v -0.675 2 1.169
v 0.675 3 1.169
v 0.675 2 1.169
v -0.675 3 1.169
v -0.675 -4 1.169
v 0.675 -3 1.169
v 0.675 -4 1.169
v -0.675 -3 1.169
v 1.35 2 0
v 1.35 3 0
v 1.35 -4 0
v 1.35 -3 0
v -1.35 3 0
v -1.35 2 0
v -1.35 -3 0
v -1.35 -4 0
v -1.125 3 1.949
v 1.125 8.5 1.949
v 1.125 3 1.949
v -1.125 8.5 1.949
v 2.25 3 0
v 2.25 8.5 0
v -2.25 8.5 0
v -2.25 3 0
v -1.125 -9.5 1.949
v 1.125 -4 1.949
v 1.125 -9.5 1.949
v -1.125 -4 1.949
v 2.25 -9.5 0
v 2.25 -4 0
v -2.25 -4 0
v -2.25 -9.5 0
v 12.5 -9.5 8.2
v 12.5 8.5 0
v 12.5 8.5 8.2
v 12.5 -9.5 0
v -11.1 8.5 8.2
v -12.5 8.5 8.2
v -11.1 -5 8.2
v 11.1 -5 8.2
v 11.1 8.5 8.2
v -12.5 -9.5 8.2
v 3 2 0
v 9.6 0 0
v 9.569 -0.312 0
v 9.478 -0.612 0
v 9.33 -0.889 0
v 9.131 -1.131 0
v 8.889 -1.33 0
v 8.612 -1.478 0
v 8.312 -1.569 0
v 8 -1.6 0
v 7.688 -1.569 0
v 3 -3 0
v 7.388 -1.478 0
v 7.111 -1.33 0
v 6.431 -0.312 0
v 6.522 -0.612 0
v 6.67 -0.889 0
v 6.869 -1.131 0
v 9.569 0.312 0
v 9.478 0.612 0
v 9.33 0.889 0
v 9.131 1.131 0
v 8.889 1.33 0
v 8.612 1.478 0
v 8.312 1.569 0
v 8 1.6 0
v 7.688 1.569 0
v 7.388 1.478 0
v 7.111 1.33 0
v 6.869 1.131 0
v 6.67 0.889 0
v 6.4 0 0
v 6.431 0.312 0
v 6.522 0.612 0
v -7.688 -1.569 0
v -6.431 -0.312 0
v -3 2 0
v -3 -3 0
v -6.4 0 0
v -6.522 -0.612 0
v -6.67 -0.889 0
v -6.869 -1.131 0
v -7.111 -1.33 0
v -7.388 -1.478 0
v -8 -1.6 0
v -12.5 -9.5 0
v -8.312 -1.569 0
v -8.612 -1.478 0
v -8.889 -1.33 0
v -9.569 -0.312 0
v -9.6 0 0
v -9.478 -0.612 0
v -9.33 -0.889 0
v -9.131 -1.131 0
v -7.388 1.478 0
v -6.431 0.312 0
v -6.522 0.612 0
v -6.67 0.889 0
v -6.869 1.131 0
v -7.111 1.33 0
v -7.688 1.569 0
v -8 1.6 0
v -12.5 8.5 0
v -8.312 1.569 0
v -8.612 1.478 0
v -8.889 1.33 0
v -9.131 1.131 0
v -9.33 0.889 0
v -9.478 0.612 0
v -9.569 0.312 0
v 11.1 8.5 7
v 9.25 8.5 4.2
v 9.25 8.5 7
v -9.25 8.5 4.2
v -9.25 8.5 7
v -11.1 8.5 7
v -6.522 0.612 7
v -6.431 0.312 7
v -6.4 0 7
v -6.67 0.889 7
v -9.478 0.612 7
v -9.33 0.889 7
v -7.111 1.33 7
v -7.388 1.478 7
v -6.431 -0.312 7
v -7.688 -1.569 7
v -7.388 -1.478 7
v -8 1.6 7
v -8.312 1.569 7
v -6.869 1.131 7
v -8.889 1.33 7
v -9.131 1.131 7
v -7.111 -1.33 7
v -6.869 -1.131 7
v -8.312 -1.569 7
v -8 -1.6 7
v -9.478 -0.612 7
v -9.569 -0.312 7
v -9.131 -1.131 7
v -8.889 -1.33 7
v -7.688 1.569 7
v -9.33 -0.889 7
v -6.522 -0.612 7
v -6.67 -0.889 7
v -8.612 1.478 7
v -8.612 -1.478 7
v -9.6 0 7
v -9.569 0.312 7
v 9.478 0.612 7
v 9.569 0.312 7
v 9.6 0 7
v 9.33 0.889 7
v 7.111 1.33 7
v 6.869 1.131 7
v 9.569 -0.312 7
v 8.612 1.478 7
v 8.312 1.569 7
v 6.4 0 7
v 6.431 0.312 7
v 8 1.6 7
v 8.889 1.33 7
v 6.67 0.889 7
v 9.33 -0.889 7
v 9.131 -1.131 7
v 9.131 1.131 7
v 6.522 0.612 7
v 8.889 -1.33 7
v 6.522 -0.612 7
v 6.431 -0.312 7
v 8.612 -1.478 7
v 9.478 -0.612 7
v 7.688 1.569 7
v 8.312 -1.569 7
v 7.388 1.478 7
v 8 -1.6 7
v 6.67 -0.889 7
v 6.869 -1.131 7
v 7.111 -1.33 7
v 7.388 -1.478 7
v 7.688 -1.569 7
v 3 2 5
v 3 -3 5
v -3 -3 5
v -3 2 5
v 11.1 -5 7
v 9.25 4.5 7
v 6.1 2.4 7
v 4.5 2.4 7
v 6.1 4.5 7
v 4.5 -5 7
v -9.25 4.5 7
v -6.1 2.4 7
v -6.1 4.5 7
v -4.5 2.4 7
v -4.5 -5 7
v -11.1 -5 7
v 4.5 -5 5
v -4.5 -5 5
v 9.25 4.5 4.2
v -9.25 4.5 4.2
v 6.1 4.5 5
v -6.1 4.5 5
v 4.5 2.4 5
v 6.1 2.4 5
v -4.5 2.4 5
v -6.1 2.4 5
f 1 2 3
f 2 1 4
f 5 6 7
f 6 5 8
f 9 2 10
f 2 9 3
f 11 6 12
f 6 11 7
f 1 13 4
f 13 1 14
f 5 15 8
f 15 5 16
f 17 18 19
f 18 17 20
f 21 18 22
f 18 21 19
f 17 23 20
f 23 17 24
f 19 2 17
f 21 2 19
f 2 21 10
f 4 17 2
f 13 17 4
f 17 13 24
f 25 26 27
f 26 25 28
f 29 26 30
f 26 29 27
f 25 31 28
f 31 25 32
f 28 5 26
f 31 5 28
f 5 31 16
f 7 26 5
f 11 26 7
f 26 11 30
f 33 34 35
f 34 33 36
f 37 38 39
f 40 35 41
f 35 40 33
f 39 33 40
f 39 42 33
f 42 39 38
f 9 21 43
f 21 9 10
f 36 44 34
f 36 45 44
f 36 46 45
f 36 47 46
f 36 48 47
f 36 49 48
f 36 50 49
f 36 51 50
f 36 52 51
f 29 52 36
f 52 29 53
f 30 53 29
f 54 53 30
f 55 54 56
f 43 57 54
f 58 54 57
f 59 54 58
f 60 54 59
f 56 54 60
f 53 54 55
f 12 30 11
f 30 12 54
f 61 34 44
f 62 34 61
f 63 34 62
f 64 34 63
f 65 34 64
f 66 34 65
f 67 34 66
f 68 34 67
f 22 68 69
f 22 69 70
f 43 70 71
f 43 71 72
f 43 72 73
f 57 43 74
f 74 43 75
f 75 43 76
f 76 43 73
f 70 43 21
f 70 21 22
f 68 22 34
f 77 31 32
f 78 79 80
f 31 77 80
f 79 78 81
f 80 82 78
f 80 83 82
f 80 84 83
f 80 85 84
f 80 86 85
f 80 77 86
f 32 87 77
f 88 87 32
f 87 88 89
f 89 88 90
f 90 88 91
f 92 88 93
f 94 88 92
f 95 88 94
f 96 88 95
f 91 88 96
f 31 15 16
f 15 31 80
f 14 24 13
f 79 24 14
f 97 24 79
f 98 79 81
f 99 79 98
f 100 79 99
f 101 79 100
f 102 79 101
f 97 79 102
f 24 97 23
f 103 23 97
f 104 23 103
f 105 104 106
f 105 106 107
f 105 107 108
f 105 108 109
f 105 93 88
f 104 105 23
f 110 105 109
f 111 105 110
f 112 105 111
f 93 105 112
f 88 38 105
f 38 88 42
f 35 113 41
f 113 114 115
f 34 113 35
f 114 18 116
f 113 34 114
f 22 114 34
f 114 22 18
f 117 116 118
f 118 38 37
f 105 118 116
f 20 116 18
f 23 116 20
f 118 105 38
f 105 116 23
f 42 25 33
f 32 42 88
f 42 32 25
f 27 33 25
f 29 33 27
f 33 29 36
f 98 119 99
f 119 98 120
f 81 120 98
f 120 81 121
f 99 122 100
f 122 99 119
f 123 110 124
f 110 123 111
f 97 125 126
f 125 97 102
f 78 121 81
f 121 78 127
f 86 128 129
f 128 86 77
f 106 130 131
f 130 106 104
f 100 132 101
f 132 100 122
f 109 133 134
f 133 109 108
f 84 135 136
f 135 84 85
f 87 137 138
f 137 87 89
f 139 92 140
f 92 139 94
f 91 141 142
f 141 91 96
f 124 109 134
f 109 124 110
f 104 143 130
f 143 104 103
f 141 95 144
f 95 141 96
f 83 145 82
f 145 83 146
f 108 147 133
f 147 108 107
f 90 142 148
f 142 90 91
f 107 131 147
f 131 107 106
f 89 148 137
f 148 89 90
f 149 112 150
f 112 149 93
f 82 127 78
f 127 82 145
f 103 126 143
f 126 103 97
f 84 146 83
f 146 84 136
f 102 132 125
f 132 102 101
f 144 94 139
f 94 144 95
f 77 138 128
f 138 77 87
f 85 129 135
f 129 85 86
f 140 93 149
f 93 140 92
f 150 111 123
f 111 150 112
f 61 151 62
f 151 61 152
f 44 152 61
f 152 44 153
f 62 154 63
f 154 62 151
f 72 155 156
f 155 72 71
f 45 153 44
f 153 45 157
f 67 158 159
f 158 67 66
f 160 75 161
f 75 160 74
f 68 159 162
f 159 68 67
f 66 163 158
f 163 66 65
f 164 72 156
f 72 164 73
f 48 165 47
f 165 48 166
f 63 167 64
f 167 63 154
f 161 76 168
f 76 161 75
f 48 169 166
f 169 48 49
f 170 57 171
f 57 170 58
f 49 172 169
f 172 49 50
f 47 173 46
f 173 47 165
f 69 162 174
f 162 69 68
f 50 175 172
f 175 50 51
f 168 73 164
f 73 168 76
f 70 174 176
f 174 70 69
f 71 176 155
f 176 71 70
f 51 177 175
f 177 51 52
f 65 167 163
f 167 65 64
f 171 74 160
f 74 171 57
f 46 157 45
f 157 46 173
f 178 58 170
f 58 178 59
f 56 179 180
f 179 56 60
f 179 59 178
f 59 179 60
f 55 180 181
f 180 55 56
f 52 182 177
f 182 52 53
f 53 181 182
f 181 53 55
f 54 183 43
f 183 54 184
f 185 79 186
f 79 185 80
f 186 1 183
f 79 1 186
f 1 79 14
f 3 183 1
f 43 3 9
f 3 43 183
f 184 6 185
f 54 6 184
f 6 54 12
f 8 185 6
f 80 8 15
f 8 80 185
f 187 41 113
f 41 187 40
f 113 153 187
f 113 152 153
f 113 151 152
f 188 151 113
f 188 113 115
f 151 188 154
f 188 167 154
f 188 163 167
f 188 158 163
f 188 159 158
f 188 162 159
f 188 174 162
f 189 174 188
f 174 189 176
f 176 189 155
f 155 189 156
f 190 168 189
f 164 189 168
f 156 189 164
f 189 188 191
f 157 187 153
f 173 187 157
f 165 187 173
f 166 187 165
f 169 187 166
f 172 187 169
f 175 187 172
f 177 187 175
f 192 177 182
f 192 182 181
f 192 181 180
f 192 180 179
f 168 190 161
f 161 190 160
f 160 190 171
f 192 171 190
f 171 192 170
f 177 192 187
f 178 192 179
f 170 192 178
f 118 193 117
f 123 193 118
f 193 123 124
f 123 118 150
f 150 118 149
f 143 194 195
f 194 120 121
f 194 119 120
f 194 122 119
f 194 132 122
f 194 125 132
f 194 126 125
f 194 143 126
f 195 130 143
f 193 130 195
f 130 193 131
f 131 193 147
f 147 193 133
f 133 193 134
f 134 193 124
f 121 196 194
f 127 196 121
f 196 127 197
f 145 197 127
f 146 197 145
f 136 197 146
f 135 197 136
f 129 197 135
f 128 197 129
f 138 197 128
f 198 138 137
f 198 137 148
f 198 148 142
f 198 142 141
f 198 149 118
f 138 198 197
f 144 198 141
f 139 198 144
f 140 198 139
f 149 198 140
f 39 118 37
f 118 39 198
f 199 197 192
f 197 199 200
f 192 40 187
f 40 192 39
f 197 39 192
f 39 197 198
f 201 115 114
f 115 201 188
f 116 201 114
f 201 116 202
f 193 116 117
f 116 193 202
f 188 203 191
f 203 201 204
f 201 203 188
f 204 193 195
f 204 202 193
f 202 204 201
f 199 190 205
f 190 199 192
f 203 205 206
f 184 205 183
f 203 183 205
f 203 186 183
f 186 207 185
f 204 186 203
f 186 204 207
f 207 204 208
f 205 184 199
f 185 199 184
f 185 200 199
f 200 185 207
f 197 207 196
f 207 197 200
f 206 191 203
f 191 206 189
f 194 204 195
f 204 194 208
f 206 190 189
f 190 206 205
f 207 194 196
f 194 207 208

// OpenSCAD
/* [Hidden] */
// Duet3D laser filament sensor housing by D. Crocker, Escher 3D

/* [Options] */

// Select the PCB version of the filament monitor. Version 2 has the LED in the corner.
version = 2;						// [1,2]

// Select height of the filament centre above the PCB
filamentHeight=7;				// [4:0.2:9]

// Select the nominal diameter of the cutout for the PTFE tube. This needs to be somewhat larger than the outside diameter of the tube, but small enough to grip the tube when the two pieces are fastened together.
tubeDiameter=4.5;				// [4.0:0.1:5.2]

// Select the nominal diameter of the holes in the tube end stops for the filament to pass through. This needs to be somewhat larger than the outside diameter of the filament to prevent it rubbing, but smaller than the outside diameter of the tubing.
innerDiameter=2.7;				// [2.0:0.1:4.2]

// Do you want the top to be open or closed?
closedTop = 1;					// [0:Open,1:Closed]

/* [Hidden] */

width=25;
depth=(version == 1) ? 15 : 18;
holeSpacing=16;

boardWidth=22.2;					// added 0.2mm clearance
boardComponentsWidth1=18.5;
boardComponentsWidth2=9;
boardComponentsWidth3=12.2;
boardComponentsHeight1=2.8;		// the deepest parts are the connector spills
boardComponentsHeight2=2.0;		// the deepest parts are the connector spills

holeInsetDepth1=5;
holeInsetDepth2=4.5;
holeInsetDepth3=2.4;
boardDepth=9.5;
boardThickness=1.2;
stopThickness=1.0;

topHeight=4;
innerTubeDiameter=2.5;
chipDepth= (version == 1) ? 4 : 5;
chipOffset = (version == 1) ? 0 : -0.5;
chipWidth=6;
M3clear=3.2;
M3head=7.5;

overlap=0.2;

module cubeXY(x,y,z) {
	translate([-x/2, -y/2, 0]) cube([x,y,z]);
}

module cubeX(x,y,z) {
	translate([-x/2, 0, 0]) cube([x,y,z]);
}

module FilamentGroove() {
	translate([0, -depth/2-overlap, 0]) rotate([-90,0,0]) cylinder(r=innerDiameter/2,h=99,$fn=6);
	translate([0, chipDepth/2+chipOffset+stopThickness, 0]) rotate([-90,0,0]) cylinder(r=tubeDiameter/2,h=99,$fn=6);
	translate([0, -chipDepth/2+chipOffset-stopThickness, 0]) rotate([90,0,0]) cylinder(r=tubeDiameter/2,h=99,$fn=6);
}

module Base(thickness) {
	difference() {
		translate([0,chipOffset,0]) cubeXY(width,depth,thickness+boardThickness);
		translate([-holeSpacing/2,0,-overlap]) cylinder(r=M3clear/2, h=99, $fn=32);
		translate([holeSpacing/2,0,-overlap]) cylinder(r=M3clear/2, h=99, $fn=32);
		FilamentGroove();
		translate([0,chipOffset,-overlap]) cubeXY(chipWidth, chipDepth, thickness+2*overlap);
		translate([0,-holeInsetDepth1, thickness]) cubeX(boardWidth,depth, boardThickness+overlap);
		translate([0,+holeInsetDepth2, thickness-boardComponentsHeight1])
			cubeX(boardComponentsWidth1, depth, boardComponentsHeight1+overlap);
		translate([0,-holeInsetDepth1, thickness-boardComponentsHeight2])
			cubeX(boardComponentsWidth2, depth, boardComponentsHeight2+overlap);
		if (version == 1) {
			// Cutout for LED
			translate([-20,holeInsetDepth2,thickness-boardComponentsHeight2]) cube([20,5,10]);
		}
		if (version == 2) {
			// Version 2 prototype has additional SMD components that we need to clear
			translate([0,+holeInsetDepth3, thickness-boardComponentsHeight2])
				cubeX(boardComponentsWidth3, depth, boardComponentsHeight2+overlap);
		}
	}
}

module Top(thickness, isClosed) {
	difference() {
		translate([0,chipOffset,0]) cubeXY(width,depth,(isClosed) ? thickness + 1 : thickness);
		translate([0,chipOffset,(isClosed) ? 1 : -overlap]) cubeXY(chipWidth, chipDepth, thickness+2*overlap);
		translate([-holeSpacing/2,0,-overlap]) cylinder(r=M3clear/2, h=99, $fn=32);
		translate([holeSpacing/2,0,-overlap]) cylinder(r=M3clear/2, h=99, $fn=32);
		translate([0,0,(isClosed) ? thickness + 1 : thickness]) FilamentGroove();
	}
}

Base(filamentHeight);
//translate([0, 25, 0]) Top(topHeight, closedTop);
